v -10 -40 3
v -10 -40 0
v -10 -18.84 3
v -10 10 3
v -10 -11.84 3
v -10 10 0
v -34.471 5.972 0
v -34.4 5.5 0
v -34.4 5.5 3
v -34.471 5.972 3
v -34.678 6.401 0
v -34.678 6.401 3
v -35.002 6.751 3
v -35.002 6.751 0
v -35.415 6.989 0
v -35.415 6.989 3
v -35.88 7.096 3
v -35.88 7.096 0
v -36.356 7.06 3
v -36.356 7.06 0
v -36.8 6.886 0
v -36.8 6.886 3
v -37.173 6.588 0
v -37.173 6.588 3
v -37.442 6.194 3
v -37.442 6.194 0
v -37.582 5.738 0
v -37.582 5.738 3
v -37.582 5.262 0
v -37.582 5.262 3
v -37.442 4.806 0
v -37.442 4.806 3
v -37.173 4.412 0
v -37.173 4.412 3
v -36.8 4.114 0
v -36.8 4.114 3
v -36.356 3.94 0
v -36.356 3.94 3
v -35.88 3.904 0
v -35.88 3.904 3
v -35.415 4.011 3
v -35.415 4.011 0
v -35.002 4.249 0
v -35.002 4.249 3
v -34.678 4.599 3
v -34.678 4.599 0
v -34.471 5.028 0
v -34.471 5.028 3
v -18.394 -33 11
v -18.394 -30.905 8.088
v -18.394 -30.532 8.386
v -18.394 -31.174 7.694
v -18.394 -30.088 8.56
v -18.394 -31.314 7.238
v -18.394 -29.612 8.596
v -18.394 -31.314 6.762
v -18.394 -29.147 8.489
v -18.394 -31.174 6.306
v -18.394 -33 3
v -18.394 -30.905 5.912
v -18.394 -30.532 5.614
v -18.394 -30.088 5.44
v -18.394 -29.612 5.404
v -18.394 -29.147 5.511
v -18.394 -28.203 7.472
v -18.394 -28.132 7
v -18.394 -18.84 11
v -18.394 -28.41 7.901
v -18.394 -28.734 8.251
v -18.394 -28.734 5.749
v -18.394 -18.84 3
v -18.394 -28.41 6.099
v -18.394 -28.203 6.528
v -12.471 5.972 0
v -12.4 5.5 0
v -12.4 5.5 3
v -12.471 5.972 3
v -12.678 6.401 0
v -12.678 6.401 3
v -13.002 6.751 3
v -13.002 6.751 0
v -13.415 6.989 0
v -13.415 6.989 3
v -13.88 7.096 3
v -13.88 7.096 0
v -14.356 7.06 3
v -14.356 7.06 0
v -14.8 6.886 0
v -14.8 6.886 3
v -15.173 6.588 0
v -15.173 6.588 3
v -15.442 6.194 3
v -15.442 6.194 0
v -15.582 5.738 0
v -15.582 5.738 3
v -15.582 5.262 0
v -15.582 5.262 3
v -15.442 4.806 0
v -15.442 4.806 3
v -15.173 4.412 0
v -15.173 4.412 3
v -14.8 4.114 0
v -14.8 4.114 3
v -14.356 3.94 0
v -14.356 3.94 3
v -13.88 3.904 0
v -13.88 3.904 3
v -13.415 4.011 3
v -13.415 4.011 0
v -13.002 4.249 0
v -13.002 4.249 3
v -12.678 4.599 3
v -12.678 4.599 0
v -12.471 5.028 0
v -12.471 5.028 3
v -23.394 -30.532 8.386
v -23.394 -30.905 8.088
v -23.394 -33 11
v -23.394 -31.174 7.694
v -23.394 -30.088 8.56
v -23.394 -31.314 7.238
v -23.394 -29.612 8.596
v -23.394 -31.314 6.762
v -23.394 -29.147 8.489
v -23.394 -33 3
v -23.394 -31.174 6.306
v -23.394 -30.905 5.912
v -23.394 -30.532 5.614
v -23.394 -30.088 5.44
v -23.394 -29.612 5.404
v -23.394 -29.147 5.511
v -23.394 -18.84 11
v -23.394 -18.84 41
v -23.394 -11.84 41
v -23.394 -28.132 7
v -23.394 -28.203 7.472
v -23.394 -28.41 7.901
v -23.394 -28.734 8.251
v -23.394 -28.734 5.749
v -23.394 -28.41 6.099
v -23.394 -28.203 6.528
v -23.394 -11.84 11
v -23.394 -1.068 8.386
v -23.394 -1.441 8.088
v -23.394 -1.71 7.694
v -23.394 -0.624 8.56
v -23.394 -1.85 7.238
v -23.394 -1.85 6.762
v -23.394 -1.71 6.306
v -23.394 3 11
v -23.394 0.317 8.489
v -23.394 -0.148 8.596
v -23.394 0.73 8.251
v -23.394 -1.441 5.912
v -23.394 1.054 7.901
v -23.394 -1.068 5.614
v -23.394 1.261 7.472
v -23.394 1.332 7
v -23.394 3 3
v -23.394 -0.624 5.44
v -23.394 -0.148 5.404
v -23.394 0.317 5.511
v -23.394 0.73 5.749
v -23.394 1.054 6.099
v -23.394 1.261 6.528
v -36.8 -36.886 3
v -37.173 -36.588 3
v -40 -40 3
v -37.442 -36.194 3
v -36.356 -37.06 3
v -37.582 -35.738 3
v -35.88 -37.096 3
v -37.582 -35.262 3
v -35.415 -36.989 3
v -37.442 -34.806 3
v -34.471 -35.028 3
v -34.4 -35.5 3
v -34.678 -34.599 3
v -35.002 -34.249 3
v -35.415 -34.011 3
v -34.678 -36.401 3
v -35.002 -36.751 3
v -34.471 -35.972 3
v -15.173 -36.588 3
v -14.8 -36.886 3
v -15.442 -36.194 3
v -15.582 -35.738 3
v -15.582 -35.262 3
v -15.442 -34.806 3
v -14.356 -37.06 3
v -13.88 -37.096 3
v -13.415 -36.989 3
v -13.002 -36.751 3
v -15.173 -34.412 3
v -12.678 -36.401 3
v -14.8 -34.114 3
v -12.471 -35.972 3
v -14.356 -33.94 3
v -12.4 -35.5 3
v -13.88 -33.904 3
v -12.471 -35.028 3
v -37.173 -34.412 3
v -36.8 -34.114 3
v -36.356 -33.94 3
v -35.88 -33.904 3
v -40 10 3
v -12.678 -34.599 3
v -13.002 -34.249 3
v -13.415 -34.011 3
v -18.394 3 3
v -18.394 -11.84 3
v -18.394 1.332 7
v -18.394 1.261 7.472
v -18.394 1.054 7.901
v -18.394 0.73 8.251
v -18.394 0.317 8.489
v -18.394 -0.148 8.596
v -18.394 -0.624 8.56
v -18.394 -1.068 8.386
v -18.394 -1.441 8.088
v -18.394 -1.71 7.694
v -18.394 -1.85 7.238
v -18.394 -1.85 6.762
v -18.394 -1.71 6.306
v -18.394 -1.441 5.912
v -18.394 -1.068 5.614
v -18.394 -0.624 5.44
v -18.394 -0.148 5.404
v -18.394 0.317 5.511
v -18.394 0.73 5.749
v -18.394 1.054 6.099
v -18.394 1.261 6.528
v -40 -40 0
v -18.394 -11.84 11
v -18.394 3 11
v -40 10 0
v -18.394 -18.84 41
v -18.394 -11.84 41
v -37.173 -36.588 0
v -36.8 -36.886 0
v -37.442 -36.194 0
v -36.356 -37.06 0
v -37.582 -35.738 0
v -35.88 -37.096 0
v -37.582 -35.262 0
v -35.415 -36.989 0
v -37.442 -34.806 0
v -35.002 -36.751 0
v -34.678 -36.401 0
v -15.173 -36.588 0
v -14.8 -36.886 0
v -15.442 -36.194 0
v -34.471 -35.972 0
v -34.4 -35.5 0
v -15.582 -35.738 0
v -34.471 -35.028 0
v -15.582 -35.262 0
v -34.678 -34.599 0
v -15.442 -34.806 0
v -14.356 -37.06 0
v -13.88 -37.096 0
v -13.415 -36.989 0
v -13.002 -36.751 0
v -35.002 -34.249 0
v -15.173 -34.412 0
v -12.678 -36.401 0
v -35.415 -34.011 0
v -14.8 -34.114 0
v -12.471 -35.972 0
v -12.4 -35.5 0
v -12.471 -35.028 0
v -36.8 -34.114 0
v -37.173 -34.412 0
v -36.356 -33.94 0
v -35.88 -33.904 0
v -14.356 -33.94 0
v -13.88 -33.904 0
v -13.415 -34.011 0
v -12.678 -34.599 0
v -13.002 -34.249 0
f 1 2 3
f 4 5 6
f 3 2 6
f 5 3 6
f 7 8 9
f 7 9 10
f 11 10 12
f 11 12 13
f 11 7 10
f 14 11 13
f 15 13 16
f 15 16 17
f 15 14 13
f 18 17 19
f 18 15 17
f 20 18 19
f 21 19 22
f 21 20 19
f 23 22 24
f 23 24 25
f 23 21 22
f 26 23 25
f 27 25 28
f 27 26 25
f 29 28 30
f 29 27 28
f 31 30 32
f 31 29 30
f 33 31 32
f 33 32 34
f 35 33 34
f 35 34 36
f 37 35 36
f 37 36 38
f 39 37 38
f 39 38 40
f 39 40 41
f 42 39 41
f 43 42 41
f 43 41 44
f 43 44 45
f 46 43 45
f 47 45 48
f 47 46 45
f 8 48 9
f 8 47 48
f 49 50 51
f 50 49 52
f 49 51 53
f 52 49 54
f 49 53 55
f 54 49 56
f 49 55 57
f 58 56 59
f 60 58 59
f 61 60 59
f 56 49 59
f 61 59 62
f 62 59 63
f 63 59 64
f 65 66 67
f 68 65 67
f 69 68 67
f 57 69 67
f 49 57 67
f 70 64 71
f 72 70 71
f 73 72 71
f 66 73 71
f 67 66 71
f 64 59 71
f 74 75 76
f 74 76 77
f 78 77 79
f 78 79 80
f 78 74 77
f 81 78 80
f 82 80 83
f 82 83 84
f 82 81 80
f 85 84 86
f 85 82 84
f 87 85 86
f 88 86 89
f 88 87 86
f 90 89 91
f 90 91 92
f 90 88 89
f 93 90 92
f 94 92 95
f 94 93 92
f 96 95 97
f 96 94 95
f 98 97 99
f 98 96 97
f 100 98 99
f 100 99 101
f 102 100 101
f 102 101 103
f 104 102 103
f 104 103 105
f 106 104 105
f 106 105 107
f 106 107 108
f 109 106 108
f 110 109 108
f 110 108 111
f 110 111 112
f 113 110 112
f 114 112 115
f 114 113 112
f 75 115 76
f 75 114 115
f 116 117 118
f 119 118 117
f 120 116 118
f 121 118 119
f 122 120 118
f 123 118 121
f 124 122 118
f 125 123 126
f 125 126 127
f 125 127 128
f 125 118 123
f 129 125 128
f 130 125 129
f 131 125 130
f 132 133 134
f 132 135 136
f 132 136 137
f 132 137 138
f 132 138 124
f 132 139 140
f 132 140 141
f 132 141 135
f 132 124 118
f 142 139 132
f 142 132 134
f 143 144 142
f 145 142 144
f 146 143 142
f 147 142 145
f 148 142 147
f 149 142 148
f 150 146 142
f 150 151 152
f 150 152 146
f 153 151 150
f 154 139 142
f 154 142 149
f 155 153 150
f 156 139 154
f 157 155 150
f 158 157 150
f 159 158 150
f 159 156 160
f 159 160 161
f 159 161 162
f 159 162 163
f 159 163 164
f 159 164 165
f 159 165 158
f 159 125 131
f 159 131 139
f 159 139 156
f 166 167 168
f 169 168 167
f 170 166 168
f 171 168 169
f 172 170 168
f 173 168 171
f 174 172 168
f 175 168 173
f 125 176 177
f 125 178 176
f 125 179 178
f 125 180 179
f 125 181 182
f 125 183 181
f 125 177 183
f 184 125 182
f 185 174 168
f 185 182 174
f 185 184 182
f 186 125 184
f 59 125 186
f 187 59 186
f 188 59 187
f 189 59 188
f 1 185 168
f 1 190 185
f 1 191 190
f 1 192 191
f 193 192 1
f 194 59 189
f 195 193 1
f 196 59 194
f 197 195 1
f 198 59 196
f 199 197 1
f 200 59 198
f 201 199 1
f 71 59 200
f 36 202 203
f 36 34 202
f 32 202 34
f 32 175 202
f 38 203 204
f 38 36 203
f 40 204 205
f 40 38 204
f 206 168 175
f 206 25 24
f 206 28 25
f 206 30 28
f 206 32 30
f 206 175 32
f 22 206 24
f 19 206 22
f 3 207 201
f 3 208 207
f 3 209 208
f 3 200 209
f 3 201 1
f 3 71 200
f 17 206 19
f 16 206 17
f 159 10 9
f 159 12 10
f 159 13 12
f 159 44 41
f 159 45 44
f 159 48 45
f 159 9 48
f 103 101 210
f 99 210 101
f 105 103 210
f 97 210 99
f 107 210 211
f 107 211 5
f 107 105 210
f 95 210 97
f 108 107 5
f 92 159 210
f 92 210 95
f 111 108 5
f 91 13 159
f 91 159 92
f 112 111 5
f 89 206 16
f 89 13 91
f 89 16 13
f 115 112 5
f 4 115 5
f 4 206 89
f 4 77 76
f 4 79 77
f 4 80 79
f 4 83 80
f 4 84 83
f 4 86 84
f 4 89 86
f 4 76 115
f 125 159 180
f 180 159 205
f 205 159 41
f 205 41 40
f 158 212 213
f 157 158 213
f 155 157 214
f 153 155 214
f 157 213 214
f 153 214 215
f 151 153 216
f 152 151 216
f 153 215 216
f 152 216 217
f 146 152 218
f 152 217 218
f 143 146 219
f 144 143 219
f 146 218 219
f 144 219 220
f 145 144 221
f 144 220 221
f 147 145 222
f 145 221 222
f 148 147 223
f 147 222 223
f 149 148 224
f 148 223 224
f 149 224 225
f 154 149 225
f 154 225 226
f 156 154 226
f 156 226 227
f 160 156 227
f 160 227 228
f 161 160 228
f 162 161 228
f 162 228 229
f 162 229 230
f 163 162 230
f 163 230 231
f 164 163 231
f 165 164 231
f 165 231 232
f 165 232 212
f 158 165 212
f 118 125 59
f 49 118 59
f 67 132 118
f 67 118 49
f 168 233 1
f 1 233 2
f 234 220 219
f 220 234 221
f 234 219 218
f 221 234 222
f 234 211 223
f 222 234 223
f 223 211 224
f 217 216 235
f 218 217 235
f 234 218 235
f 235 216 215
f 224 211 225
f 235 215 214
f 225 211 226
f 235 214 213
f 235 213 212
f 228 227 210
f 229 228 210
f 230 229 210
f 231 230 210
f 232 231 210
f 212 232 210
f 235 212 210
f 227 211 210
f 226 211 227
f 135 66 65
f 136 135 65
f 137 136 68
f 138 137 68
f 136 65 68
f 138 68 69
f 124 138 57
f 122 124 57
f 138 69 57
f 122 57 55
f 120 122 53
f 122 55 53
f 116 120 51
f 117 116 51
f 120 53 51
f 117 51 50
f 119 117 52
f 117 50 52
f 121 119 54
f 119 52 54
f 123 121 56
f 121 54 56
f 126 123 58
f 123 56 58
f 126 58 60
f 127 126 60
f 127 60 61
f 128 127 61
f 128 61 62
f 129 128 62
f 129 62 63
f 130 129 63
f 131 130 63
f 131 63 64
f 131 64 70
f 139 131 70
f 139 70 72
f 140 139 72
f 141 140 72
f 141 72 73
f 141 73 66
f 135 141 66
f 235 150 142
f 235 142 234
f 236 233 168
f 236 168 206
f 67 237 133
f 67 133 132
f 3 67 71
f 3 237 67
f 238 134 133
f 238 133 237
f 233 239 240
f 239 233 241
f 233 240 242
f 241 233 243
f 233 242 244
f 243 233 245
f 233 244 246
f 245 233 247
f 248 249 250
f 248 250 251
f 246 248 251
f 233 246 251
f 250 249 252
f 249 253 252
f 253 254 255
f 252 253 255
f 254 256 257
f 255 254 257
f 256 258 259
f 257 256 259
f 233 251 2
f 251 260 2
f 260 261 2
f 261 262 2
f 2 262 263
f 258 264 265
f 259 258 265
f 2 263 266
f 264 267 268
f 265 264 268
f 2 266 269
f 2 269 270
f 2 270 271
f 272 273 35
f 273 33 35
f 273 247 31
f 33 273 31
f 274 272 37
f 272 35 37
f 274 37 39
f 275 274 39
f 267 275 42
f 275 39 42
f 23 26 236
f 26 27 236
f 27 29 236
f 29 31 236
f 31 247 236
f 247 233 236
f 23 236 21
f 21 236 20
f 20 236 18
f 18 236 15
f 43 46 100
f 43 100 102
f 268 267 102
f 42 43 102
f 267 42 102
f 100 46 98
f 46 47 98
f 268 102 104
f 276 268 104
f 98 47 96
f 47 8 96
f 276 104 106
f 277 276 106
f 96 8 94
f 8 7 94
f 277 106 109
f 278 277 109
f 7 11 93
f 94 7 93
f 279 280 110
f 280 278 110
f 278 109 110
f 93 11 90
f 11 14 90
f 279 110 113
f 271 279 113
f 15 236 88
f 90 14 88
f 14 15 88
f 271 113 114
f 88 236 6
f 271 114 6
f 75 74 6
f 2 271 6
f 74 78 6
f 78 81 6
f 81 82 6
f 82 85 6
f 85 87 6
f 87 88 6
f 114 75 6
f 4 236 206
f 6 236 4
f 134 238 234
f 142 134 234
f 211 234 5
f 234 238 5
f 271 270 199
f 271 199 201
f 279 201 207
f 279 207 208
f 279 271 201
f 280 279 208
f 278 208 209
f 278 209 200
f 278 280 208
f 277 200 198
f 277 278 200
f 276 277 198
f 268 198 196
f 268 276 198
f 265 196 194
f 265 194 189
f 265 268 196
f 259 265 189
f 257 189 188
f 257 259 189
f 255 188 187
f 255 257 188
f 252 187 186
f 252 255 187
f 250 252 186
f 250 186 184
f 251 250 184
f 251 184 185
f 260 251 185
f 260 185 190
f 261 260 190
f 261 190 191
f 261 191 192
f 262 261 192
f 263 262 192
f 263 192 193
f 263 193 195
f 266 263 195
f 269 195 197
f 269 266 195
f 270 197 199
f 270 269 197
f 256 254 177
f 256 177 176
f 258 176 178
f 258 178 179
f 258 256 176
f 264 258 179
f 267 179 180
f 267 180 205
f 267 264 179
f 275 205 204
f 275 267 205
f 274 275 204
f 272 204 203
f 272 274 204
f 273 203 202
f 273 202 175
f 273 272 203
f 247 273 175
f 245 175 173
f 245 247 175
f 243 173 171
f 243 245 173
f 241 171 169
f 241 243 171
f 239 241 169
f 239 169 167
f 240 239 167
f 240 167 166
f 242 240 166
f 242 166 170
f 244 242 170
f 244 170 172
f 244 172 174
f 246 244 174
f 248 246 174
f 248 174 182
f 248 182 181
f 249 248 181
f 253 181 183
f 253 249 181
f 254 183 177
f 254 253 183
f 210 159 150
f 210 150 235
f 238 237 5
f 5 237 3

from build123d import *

# Parameters (mm, degrees)
SKETCH_1_W          = 30
SKETCH_1_H          = 50
SKETCH_1_R          = 1.6
EXTRUDE_1_DEPTH     = 3
SKETCH_2_W          = 5
SKETCH_2_H          = 36
EXTRUDE_2_DEPTH     = 8
SKETCH_5_R          = 1.6
CUT_EXTRUDE_1_DEPTH = 10
SKETCH_6_W          = 5
SKETCH_6_H          = 7
EXTRUDE_3_DEPTH     = 30
RIB_1_REACH         = 65.828
SKETCH_7_WALL_W     = 168.57168005
SKETCH_7_WALL_H     = 7


with BuildPart() as part:
    # 草图1 → 凸台-拉伸1 (new body)
    with BuildSketch(Plane.XY):
        with Locations((-25, -15)):
            Rectangle(SKETCH_1_W, SKETCH_1_H)
        with Locations((-14, 5.5)):
            Circle(SKETCH_1_R, mode=Mode.SUBTRACT)
        with Locations((-36, -35.5)):
            Circle(SKETCH_1_R, mode=Mode.SUBTRACT)
        with Locations((-14, -35.5)):
            Circle(SKETCH_1_R, mode=Mode.SUBTRACT)
        with Locations((-36, 5.5)):
            Circle(SKETCH_1_R, mode=Mode.SUBTRACT)
    extrude(amount=EXTRUDE_1_DEPTH)

    # 草图2 → 凸台-拉伸2 (add)
    with BuildSketch(Plane.XY.offset(3)):
        with Locations((-20.894219559, -15)):
            Rectangle(SKETCH_2_W, SKETCH_2_H)
    extrude(amount=EXTRUDE_2_DEPTH)

    # 草图5 → 切除-拉伸1 (cut)
    with BuildSketch(Plane(origin=(-18.394219559, 0, 0), x_dir=(0, 0, -1), z_dir=(1, 0, 0))):
        with Locations(Location((-7, -0.268, 0), (0, 0, 90))):
            Circle(SKETCH_5_R)
        with Locations(Location((-7, -29.732, 0), (0, 0, 90))):
            Circle(SKETCH_5_R)
    extrude(amount=-CUT_EXTRUDE_1_DEPTH, mode=Mode.SUBTRACT)

    # 草图6 → 凸台-拉伸3 (add)
    with BuildSketch(Plane.XY.offset(11)):
        with Locations((-20.894219559, -15.339980262)):
            Rectangle(SKETCH_6_W, SKETCH_6_H)
    extrude(amount=EXTRUDE_3_DEPTH)

    # 草图7 wall → 筋1 (add, up to next)
    with BuildSketch(Plane(origin=(-14.197109779, -11.839980262, 22), x_dir=(0.215700425519, 0, -0.97645958771), z_dir=(-0.97645958771, 0, -0.215700425519)), mode=Mode.PRIVATE) as rib_1_sk1:
        with Locations((0, 3.5)):
            Rectangle(SKETCH_7_WALL_W, SKETCH_7_WALL_H)
    rib_1_tool1 = extrude(rib_1_sk1.sketch, amount=RIB_1_REACH, mode=Mode.PRIVATE) - part.part
    add(rib_1_tool1.solids().sort_by_distance((-14.197109779, -11.839980262, 22))[0])


solid = part.part
